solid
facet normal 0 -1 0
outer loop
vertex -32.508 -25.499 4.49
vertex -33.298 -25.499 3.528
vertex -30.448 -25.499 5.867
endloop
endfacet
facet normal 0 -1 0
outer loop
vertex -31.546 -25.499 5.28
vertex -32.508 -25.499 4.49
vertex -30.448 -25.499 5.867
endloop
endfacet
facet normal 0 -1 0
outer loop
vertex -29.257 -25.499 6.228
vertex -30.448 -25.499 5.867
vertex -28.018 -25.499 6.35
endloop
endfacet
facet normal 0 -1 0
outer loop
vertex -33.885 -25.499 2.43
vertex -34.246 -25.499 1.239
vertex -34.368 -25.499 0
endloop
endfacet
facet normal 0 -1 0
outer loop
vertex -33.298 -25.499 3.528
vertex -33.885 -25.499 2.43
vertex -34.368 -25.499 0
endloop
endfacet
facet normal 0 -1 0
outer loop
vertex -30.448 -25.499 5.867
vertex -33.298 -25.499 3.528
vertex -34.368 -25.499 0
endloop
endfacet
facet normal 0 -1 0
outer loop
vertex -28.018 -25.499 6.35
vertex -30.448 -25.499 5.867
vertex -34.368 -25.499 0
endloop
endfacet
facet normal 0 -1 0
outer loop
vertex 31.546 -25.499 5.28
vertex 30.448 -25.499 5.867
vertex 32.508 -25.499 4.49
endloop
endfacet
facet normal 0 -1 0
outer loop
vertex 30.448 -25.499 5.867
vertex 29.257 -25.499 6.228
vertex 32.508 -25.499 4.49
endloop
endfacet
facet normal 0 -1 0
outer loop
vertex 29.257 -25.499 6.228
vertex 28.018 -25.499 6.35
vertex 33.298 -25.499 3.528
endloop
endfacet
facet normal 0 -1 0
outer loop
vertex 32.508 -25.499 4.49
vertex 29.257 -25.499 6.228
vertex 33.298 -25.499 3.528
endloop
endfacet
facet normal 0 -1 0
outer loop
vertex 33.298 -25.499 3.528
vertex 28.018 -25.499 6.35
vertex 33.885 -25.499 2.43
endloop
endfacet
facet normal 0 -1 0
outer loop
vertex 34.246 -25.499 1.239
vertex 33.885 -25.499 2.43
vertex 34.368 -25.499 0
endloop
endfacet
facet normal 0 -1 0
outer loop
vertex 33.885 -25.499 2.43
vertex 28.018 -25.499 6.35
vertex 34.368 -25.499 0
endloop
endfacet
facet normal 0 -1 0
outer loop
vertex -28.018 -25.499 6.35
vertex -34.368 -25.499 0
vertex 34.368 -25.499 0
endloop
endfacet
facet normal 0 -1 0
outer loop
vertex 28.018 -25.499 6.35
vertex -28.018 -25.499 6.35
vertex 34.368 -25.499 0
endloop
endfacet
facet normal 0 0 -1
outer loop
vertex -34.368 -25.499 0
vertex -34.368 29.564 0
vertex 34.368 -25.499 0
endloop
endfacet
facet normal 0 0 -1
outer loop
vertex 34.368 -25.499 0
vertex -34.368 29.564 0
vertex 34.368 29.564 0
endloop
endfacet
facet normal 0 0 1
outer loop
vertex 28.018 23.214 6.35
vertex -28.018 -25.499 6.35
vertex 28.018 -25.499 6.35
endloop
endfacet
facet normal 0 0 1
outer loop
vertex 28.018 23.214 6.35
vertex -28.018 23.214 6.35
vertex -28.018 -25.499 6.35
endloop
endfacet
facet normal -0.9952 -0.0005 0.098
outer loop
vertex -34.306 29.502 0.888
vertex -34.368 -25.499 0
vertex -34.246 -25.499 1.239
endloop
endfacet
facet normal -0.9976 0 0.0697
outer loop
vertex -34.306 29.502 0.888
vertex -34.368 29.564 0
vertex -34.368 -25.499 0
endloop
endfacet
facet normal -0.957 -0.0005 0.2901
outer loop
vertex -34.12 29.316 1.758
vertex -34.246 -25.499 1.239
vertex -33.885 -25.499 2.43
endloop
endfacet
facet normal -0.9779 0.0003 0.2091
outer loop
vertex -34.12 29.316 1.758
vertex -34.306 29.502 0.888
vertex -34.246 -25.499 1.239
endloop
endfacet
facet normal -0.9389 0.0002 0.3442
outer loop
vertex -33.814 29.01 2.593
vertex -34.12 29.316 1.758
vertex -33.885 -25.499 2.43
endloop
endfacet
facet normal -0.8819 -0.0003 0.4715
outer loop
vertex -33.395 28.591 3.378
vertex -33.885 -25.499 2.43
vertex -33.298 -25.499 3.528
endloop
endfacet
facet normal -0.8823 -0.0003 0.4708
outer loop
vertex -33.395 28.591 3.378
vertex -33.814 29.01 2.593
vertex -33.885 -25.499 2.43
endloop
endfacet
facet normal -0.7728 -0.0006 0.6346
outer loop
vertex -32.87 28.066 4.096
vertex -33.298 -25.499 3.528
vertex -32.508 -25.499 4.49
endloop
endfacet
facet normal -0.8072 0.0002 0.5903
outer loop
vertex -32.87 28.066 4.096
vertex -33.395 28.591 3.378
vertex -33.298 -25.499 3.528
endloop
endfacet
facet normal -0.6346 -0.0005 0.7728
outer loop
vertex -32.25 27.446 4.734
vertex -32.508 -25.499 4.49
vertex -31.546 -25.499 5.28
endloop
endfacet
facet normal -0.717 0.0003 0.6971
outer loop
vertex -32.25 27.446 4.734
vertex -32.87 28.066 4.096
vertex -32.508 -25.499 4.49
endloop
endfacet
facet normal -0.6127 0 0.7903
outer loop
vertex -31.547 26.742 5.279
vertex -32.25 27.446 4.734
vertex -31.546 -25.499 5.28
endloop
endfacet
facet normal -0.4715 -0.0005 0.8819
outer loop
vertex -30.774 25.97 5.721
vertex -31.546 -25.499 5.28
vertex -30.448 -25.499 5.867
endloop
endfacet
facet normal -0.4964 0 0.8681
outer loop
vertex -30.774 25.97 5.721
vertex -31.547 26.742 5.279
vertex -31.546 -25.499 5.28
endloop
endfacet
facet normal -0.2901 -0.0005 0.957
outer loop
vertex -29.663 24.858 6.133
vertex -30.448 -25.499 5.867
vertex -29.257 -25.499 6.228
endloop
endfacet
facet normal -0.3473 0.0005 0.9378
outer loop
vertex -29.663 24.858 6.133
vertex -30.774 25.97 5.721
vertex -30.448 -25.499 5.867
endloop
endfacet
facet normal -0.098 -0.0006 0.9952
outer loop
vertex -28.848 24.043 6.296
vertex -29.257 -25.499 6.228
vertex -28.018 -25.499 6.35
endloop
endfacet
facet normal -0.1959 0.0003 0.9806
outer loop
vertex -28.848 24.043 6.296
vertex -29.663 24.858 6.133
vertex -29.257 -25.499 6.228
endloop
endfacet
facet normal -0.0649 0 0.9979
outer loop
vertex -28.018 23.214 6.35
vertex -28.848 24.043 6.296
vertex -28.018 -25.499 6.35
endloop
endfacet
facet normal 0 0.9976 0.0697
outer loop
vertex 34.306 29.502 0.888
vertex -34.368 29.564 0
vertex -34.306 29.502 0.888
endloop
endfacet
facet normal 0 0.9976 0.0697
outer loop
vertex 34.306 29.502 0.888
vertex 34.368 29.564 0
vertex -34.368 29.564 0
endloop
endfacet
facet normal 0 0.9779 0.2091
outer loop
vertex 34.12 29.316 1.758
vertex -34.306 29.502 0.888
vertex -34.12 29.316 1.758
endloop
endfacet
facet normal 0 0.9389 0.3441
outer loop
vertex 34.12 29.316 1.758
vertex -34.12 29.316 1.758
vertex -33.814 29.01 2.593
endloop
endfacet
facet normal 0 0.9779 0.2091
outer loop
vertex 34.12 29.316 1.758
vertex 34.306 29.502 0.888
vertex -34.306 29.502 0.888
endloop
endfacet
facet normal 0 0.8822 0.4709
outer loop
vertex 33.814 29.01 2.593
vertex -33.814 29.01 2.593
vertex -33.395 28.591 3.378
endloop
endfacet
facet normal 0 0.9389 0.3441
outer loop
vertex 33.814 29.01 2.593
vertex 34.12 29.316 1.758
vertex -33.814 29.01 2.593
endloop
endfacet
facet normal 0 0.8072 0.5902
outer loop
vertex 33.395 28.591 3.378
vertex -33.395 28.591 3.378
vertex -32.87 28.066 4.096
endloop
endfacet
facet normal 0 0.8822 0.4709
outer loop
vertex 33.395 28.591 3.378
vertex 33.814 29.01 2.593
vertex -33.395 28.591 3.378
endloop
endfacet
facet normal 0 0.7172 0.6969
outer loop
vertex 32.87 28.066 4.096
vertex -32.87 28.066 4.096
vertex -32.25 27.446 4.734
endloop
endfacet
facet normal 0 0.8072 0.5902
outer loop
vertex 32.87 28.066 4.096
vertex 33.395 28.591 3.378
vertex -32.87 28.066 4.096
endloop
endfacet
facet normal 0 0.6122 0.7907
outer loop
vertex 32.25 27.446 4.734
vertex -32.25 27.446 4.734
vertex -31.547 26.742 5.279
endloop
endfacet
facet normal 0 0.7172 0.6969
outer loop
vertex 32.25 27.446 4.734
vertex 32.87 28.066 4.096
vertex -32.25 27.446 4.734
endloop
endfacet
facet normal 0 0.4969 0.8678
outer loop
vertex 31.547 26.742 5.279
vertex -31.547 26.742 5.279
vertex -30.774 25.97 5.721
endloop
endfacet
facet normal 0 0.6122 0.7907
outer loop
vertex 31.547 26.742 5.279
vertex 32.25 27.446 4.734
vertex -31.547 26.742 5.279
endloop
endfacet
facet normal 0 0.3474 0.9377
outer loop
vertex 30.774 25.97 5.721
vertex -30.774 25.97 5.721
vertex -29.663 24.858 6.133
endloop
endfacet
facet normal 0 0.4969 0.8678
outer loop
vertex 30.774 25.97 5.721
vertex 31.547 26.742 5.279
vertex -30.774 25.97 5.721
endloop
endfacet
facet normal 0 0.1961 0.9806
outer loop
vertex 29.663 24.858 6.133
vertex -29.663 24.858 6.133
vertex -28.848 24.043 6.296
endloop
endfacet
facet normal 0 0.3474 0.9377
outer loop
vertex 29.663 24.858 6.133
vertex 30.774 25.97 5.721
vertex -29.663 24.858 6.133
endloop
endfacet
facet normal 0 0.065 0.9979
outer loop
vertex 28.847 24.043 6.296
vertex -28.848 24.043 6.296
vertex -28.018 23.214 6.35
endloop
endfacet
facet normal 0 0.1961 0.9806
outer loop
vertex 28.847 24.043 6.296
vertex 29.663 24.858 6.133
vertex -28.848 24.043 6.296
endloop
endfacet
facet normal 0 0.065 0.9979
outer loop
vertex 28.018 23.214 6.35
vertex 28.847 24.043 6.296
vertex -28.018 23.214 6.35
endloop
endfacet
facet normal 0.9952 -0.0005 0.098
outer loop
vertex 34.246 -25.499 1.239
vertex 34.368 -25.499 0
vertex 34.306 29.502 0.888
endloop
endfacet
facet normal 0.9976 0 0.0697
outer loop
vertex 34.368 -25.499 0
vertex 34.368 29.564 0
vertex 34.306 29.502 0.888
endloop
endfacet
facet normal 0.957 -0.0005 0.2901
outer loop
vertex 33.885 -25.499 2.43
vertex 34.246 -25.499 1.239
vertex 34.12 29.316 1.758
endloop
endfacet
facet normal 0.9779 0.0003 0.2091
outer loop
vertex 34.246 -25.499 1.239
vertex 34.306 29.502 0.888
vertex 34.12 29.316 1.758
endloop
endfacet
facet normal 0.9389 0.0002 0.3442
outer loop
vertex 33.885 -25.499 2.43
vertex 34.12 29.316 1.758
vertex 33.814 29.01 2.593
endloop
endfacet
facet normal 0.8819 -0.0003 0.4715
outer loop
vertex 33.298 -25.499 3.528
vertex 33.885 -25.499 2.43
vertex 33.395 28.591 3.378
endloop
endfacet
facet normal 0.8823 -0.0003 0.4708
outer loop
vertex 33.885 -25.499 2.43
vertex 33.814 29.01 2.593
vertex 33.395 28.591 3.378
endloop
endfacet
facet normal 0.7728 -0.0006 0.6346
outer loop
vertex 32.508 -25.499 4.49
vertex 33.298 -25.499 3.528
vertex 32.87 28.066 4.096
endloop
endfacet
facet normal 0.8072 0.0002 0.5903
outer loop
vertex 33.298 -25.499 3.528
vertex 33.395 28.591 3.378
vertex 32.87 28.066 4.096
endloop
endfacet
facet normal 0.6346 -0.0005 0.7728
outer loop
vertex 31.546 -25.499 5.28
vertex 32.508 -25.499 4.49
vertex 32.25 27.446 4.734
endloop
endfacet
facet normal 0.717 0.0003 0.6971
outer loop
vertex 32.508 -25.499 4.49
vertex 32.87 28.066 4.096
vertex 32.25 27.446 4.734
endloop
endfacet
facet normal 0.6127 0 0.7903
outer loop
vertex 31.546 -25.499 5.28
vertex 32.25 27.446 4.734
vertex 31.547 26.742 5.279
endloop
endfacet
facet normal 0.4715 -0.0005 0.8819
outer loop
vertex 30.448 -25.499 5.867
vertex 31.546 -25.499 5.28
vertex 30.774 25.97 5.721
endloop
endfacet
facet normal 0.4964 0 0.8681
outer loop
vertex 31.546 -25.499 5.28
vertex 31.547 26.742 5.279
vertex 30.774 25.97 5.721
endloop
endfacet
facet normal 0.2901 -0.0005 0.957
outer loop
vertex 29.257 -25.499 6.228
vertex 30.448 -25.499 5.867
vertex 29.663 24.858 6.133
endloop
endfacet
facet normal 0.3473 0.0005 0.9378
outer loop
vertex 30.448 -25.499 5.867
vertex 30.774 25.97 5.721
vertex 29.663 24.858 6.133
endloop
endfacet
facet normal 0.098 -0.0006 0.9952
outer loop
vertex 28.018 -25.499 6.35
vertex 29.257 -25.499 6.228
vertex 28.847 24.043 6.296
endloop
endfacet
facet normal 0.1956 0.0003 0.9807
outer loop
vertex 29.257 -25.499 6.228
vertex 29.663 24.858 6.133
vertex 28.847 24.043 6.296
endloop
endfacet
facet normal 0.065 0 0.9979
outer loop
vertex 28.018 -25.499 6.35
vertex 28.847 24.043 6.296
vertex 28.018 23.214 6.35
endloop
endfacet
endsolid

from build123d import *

# Parameters (mm, degrees)
F0_W     = 68.736359477
F0_H     = 55.0630092621
F1_DEPTH = 6.35
F2_R     = 6.34999


# Not quite as in the source:
# - a fillet or chamfer is up to 0.001 mm smaller than in the source, because OpenCascade refuses the exact size


with BuildPart() as f1:
    # F0 (on Top) → F1 (new body)
    with BuildSketch(Plane.XY):
        with Locations((-7.4506e-06, 2.0325183868)):
            Rectangle(F0_W, F0_H)
    extrude(amount=F1_DEPTH)

    # F2 (radius 6.35 in the source; OpenCascade refuses exactly that, so slightly less here)
    f2_edges = [f1.edges().sort_by_distance(p)[0] for p in [
        (-7e-06, 29.564023, 6.35),
        (34.368172, 2.032518, 6.35),
        (-34.368187, 2.032518, 6.35),
    ]]
    fillet(f2_edges, radius=F2_R)


solid = f1.part
